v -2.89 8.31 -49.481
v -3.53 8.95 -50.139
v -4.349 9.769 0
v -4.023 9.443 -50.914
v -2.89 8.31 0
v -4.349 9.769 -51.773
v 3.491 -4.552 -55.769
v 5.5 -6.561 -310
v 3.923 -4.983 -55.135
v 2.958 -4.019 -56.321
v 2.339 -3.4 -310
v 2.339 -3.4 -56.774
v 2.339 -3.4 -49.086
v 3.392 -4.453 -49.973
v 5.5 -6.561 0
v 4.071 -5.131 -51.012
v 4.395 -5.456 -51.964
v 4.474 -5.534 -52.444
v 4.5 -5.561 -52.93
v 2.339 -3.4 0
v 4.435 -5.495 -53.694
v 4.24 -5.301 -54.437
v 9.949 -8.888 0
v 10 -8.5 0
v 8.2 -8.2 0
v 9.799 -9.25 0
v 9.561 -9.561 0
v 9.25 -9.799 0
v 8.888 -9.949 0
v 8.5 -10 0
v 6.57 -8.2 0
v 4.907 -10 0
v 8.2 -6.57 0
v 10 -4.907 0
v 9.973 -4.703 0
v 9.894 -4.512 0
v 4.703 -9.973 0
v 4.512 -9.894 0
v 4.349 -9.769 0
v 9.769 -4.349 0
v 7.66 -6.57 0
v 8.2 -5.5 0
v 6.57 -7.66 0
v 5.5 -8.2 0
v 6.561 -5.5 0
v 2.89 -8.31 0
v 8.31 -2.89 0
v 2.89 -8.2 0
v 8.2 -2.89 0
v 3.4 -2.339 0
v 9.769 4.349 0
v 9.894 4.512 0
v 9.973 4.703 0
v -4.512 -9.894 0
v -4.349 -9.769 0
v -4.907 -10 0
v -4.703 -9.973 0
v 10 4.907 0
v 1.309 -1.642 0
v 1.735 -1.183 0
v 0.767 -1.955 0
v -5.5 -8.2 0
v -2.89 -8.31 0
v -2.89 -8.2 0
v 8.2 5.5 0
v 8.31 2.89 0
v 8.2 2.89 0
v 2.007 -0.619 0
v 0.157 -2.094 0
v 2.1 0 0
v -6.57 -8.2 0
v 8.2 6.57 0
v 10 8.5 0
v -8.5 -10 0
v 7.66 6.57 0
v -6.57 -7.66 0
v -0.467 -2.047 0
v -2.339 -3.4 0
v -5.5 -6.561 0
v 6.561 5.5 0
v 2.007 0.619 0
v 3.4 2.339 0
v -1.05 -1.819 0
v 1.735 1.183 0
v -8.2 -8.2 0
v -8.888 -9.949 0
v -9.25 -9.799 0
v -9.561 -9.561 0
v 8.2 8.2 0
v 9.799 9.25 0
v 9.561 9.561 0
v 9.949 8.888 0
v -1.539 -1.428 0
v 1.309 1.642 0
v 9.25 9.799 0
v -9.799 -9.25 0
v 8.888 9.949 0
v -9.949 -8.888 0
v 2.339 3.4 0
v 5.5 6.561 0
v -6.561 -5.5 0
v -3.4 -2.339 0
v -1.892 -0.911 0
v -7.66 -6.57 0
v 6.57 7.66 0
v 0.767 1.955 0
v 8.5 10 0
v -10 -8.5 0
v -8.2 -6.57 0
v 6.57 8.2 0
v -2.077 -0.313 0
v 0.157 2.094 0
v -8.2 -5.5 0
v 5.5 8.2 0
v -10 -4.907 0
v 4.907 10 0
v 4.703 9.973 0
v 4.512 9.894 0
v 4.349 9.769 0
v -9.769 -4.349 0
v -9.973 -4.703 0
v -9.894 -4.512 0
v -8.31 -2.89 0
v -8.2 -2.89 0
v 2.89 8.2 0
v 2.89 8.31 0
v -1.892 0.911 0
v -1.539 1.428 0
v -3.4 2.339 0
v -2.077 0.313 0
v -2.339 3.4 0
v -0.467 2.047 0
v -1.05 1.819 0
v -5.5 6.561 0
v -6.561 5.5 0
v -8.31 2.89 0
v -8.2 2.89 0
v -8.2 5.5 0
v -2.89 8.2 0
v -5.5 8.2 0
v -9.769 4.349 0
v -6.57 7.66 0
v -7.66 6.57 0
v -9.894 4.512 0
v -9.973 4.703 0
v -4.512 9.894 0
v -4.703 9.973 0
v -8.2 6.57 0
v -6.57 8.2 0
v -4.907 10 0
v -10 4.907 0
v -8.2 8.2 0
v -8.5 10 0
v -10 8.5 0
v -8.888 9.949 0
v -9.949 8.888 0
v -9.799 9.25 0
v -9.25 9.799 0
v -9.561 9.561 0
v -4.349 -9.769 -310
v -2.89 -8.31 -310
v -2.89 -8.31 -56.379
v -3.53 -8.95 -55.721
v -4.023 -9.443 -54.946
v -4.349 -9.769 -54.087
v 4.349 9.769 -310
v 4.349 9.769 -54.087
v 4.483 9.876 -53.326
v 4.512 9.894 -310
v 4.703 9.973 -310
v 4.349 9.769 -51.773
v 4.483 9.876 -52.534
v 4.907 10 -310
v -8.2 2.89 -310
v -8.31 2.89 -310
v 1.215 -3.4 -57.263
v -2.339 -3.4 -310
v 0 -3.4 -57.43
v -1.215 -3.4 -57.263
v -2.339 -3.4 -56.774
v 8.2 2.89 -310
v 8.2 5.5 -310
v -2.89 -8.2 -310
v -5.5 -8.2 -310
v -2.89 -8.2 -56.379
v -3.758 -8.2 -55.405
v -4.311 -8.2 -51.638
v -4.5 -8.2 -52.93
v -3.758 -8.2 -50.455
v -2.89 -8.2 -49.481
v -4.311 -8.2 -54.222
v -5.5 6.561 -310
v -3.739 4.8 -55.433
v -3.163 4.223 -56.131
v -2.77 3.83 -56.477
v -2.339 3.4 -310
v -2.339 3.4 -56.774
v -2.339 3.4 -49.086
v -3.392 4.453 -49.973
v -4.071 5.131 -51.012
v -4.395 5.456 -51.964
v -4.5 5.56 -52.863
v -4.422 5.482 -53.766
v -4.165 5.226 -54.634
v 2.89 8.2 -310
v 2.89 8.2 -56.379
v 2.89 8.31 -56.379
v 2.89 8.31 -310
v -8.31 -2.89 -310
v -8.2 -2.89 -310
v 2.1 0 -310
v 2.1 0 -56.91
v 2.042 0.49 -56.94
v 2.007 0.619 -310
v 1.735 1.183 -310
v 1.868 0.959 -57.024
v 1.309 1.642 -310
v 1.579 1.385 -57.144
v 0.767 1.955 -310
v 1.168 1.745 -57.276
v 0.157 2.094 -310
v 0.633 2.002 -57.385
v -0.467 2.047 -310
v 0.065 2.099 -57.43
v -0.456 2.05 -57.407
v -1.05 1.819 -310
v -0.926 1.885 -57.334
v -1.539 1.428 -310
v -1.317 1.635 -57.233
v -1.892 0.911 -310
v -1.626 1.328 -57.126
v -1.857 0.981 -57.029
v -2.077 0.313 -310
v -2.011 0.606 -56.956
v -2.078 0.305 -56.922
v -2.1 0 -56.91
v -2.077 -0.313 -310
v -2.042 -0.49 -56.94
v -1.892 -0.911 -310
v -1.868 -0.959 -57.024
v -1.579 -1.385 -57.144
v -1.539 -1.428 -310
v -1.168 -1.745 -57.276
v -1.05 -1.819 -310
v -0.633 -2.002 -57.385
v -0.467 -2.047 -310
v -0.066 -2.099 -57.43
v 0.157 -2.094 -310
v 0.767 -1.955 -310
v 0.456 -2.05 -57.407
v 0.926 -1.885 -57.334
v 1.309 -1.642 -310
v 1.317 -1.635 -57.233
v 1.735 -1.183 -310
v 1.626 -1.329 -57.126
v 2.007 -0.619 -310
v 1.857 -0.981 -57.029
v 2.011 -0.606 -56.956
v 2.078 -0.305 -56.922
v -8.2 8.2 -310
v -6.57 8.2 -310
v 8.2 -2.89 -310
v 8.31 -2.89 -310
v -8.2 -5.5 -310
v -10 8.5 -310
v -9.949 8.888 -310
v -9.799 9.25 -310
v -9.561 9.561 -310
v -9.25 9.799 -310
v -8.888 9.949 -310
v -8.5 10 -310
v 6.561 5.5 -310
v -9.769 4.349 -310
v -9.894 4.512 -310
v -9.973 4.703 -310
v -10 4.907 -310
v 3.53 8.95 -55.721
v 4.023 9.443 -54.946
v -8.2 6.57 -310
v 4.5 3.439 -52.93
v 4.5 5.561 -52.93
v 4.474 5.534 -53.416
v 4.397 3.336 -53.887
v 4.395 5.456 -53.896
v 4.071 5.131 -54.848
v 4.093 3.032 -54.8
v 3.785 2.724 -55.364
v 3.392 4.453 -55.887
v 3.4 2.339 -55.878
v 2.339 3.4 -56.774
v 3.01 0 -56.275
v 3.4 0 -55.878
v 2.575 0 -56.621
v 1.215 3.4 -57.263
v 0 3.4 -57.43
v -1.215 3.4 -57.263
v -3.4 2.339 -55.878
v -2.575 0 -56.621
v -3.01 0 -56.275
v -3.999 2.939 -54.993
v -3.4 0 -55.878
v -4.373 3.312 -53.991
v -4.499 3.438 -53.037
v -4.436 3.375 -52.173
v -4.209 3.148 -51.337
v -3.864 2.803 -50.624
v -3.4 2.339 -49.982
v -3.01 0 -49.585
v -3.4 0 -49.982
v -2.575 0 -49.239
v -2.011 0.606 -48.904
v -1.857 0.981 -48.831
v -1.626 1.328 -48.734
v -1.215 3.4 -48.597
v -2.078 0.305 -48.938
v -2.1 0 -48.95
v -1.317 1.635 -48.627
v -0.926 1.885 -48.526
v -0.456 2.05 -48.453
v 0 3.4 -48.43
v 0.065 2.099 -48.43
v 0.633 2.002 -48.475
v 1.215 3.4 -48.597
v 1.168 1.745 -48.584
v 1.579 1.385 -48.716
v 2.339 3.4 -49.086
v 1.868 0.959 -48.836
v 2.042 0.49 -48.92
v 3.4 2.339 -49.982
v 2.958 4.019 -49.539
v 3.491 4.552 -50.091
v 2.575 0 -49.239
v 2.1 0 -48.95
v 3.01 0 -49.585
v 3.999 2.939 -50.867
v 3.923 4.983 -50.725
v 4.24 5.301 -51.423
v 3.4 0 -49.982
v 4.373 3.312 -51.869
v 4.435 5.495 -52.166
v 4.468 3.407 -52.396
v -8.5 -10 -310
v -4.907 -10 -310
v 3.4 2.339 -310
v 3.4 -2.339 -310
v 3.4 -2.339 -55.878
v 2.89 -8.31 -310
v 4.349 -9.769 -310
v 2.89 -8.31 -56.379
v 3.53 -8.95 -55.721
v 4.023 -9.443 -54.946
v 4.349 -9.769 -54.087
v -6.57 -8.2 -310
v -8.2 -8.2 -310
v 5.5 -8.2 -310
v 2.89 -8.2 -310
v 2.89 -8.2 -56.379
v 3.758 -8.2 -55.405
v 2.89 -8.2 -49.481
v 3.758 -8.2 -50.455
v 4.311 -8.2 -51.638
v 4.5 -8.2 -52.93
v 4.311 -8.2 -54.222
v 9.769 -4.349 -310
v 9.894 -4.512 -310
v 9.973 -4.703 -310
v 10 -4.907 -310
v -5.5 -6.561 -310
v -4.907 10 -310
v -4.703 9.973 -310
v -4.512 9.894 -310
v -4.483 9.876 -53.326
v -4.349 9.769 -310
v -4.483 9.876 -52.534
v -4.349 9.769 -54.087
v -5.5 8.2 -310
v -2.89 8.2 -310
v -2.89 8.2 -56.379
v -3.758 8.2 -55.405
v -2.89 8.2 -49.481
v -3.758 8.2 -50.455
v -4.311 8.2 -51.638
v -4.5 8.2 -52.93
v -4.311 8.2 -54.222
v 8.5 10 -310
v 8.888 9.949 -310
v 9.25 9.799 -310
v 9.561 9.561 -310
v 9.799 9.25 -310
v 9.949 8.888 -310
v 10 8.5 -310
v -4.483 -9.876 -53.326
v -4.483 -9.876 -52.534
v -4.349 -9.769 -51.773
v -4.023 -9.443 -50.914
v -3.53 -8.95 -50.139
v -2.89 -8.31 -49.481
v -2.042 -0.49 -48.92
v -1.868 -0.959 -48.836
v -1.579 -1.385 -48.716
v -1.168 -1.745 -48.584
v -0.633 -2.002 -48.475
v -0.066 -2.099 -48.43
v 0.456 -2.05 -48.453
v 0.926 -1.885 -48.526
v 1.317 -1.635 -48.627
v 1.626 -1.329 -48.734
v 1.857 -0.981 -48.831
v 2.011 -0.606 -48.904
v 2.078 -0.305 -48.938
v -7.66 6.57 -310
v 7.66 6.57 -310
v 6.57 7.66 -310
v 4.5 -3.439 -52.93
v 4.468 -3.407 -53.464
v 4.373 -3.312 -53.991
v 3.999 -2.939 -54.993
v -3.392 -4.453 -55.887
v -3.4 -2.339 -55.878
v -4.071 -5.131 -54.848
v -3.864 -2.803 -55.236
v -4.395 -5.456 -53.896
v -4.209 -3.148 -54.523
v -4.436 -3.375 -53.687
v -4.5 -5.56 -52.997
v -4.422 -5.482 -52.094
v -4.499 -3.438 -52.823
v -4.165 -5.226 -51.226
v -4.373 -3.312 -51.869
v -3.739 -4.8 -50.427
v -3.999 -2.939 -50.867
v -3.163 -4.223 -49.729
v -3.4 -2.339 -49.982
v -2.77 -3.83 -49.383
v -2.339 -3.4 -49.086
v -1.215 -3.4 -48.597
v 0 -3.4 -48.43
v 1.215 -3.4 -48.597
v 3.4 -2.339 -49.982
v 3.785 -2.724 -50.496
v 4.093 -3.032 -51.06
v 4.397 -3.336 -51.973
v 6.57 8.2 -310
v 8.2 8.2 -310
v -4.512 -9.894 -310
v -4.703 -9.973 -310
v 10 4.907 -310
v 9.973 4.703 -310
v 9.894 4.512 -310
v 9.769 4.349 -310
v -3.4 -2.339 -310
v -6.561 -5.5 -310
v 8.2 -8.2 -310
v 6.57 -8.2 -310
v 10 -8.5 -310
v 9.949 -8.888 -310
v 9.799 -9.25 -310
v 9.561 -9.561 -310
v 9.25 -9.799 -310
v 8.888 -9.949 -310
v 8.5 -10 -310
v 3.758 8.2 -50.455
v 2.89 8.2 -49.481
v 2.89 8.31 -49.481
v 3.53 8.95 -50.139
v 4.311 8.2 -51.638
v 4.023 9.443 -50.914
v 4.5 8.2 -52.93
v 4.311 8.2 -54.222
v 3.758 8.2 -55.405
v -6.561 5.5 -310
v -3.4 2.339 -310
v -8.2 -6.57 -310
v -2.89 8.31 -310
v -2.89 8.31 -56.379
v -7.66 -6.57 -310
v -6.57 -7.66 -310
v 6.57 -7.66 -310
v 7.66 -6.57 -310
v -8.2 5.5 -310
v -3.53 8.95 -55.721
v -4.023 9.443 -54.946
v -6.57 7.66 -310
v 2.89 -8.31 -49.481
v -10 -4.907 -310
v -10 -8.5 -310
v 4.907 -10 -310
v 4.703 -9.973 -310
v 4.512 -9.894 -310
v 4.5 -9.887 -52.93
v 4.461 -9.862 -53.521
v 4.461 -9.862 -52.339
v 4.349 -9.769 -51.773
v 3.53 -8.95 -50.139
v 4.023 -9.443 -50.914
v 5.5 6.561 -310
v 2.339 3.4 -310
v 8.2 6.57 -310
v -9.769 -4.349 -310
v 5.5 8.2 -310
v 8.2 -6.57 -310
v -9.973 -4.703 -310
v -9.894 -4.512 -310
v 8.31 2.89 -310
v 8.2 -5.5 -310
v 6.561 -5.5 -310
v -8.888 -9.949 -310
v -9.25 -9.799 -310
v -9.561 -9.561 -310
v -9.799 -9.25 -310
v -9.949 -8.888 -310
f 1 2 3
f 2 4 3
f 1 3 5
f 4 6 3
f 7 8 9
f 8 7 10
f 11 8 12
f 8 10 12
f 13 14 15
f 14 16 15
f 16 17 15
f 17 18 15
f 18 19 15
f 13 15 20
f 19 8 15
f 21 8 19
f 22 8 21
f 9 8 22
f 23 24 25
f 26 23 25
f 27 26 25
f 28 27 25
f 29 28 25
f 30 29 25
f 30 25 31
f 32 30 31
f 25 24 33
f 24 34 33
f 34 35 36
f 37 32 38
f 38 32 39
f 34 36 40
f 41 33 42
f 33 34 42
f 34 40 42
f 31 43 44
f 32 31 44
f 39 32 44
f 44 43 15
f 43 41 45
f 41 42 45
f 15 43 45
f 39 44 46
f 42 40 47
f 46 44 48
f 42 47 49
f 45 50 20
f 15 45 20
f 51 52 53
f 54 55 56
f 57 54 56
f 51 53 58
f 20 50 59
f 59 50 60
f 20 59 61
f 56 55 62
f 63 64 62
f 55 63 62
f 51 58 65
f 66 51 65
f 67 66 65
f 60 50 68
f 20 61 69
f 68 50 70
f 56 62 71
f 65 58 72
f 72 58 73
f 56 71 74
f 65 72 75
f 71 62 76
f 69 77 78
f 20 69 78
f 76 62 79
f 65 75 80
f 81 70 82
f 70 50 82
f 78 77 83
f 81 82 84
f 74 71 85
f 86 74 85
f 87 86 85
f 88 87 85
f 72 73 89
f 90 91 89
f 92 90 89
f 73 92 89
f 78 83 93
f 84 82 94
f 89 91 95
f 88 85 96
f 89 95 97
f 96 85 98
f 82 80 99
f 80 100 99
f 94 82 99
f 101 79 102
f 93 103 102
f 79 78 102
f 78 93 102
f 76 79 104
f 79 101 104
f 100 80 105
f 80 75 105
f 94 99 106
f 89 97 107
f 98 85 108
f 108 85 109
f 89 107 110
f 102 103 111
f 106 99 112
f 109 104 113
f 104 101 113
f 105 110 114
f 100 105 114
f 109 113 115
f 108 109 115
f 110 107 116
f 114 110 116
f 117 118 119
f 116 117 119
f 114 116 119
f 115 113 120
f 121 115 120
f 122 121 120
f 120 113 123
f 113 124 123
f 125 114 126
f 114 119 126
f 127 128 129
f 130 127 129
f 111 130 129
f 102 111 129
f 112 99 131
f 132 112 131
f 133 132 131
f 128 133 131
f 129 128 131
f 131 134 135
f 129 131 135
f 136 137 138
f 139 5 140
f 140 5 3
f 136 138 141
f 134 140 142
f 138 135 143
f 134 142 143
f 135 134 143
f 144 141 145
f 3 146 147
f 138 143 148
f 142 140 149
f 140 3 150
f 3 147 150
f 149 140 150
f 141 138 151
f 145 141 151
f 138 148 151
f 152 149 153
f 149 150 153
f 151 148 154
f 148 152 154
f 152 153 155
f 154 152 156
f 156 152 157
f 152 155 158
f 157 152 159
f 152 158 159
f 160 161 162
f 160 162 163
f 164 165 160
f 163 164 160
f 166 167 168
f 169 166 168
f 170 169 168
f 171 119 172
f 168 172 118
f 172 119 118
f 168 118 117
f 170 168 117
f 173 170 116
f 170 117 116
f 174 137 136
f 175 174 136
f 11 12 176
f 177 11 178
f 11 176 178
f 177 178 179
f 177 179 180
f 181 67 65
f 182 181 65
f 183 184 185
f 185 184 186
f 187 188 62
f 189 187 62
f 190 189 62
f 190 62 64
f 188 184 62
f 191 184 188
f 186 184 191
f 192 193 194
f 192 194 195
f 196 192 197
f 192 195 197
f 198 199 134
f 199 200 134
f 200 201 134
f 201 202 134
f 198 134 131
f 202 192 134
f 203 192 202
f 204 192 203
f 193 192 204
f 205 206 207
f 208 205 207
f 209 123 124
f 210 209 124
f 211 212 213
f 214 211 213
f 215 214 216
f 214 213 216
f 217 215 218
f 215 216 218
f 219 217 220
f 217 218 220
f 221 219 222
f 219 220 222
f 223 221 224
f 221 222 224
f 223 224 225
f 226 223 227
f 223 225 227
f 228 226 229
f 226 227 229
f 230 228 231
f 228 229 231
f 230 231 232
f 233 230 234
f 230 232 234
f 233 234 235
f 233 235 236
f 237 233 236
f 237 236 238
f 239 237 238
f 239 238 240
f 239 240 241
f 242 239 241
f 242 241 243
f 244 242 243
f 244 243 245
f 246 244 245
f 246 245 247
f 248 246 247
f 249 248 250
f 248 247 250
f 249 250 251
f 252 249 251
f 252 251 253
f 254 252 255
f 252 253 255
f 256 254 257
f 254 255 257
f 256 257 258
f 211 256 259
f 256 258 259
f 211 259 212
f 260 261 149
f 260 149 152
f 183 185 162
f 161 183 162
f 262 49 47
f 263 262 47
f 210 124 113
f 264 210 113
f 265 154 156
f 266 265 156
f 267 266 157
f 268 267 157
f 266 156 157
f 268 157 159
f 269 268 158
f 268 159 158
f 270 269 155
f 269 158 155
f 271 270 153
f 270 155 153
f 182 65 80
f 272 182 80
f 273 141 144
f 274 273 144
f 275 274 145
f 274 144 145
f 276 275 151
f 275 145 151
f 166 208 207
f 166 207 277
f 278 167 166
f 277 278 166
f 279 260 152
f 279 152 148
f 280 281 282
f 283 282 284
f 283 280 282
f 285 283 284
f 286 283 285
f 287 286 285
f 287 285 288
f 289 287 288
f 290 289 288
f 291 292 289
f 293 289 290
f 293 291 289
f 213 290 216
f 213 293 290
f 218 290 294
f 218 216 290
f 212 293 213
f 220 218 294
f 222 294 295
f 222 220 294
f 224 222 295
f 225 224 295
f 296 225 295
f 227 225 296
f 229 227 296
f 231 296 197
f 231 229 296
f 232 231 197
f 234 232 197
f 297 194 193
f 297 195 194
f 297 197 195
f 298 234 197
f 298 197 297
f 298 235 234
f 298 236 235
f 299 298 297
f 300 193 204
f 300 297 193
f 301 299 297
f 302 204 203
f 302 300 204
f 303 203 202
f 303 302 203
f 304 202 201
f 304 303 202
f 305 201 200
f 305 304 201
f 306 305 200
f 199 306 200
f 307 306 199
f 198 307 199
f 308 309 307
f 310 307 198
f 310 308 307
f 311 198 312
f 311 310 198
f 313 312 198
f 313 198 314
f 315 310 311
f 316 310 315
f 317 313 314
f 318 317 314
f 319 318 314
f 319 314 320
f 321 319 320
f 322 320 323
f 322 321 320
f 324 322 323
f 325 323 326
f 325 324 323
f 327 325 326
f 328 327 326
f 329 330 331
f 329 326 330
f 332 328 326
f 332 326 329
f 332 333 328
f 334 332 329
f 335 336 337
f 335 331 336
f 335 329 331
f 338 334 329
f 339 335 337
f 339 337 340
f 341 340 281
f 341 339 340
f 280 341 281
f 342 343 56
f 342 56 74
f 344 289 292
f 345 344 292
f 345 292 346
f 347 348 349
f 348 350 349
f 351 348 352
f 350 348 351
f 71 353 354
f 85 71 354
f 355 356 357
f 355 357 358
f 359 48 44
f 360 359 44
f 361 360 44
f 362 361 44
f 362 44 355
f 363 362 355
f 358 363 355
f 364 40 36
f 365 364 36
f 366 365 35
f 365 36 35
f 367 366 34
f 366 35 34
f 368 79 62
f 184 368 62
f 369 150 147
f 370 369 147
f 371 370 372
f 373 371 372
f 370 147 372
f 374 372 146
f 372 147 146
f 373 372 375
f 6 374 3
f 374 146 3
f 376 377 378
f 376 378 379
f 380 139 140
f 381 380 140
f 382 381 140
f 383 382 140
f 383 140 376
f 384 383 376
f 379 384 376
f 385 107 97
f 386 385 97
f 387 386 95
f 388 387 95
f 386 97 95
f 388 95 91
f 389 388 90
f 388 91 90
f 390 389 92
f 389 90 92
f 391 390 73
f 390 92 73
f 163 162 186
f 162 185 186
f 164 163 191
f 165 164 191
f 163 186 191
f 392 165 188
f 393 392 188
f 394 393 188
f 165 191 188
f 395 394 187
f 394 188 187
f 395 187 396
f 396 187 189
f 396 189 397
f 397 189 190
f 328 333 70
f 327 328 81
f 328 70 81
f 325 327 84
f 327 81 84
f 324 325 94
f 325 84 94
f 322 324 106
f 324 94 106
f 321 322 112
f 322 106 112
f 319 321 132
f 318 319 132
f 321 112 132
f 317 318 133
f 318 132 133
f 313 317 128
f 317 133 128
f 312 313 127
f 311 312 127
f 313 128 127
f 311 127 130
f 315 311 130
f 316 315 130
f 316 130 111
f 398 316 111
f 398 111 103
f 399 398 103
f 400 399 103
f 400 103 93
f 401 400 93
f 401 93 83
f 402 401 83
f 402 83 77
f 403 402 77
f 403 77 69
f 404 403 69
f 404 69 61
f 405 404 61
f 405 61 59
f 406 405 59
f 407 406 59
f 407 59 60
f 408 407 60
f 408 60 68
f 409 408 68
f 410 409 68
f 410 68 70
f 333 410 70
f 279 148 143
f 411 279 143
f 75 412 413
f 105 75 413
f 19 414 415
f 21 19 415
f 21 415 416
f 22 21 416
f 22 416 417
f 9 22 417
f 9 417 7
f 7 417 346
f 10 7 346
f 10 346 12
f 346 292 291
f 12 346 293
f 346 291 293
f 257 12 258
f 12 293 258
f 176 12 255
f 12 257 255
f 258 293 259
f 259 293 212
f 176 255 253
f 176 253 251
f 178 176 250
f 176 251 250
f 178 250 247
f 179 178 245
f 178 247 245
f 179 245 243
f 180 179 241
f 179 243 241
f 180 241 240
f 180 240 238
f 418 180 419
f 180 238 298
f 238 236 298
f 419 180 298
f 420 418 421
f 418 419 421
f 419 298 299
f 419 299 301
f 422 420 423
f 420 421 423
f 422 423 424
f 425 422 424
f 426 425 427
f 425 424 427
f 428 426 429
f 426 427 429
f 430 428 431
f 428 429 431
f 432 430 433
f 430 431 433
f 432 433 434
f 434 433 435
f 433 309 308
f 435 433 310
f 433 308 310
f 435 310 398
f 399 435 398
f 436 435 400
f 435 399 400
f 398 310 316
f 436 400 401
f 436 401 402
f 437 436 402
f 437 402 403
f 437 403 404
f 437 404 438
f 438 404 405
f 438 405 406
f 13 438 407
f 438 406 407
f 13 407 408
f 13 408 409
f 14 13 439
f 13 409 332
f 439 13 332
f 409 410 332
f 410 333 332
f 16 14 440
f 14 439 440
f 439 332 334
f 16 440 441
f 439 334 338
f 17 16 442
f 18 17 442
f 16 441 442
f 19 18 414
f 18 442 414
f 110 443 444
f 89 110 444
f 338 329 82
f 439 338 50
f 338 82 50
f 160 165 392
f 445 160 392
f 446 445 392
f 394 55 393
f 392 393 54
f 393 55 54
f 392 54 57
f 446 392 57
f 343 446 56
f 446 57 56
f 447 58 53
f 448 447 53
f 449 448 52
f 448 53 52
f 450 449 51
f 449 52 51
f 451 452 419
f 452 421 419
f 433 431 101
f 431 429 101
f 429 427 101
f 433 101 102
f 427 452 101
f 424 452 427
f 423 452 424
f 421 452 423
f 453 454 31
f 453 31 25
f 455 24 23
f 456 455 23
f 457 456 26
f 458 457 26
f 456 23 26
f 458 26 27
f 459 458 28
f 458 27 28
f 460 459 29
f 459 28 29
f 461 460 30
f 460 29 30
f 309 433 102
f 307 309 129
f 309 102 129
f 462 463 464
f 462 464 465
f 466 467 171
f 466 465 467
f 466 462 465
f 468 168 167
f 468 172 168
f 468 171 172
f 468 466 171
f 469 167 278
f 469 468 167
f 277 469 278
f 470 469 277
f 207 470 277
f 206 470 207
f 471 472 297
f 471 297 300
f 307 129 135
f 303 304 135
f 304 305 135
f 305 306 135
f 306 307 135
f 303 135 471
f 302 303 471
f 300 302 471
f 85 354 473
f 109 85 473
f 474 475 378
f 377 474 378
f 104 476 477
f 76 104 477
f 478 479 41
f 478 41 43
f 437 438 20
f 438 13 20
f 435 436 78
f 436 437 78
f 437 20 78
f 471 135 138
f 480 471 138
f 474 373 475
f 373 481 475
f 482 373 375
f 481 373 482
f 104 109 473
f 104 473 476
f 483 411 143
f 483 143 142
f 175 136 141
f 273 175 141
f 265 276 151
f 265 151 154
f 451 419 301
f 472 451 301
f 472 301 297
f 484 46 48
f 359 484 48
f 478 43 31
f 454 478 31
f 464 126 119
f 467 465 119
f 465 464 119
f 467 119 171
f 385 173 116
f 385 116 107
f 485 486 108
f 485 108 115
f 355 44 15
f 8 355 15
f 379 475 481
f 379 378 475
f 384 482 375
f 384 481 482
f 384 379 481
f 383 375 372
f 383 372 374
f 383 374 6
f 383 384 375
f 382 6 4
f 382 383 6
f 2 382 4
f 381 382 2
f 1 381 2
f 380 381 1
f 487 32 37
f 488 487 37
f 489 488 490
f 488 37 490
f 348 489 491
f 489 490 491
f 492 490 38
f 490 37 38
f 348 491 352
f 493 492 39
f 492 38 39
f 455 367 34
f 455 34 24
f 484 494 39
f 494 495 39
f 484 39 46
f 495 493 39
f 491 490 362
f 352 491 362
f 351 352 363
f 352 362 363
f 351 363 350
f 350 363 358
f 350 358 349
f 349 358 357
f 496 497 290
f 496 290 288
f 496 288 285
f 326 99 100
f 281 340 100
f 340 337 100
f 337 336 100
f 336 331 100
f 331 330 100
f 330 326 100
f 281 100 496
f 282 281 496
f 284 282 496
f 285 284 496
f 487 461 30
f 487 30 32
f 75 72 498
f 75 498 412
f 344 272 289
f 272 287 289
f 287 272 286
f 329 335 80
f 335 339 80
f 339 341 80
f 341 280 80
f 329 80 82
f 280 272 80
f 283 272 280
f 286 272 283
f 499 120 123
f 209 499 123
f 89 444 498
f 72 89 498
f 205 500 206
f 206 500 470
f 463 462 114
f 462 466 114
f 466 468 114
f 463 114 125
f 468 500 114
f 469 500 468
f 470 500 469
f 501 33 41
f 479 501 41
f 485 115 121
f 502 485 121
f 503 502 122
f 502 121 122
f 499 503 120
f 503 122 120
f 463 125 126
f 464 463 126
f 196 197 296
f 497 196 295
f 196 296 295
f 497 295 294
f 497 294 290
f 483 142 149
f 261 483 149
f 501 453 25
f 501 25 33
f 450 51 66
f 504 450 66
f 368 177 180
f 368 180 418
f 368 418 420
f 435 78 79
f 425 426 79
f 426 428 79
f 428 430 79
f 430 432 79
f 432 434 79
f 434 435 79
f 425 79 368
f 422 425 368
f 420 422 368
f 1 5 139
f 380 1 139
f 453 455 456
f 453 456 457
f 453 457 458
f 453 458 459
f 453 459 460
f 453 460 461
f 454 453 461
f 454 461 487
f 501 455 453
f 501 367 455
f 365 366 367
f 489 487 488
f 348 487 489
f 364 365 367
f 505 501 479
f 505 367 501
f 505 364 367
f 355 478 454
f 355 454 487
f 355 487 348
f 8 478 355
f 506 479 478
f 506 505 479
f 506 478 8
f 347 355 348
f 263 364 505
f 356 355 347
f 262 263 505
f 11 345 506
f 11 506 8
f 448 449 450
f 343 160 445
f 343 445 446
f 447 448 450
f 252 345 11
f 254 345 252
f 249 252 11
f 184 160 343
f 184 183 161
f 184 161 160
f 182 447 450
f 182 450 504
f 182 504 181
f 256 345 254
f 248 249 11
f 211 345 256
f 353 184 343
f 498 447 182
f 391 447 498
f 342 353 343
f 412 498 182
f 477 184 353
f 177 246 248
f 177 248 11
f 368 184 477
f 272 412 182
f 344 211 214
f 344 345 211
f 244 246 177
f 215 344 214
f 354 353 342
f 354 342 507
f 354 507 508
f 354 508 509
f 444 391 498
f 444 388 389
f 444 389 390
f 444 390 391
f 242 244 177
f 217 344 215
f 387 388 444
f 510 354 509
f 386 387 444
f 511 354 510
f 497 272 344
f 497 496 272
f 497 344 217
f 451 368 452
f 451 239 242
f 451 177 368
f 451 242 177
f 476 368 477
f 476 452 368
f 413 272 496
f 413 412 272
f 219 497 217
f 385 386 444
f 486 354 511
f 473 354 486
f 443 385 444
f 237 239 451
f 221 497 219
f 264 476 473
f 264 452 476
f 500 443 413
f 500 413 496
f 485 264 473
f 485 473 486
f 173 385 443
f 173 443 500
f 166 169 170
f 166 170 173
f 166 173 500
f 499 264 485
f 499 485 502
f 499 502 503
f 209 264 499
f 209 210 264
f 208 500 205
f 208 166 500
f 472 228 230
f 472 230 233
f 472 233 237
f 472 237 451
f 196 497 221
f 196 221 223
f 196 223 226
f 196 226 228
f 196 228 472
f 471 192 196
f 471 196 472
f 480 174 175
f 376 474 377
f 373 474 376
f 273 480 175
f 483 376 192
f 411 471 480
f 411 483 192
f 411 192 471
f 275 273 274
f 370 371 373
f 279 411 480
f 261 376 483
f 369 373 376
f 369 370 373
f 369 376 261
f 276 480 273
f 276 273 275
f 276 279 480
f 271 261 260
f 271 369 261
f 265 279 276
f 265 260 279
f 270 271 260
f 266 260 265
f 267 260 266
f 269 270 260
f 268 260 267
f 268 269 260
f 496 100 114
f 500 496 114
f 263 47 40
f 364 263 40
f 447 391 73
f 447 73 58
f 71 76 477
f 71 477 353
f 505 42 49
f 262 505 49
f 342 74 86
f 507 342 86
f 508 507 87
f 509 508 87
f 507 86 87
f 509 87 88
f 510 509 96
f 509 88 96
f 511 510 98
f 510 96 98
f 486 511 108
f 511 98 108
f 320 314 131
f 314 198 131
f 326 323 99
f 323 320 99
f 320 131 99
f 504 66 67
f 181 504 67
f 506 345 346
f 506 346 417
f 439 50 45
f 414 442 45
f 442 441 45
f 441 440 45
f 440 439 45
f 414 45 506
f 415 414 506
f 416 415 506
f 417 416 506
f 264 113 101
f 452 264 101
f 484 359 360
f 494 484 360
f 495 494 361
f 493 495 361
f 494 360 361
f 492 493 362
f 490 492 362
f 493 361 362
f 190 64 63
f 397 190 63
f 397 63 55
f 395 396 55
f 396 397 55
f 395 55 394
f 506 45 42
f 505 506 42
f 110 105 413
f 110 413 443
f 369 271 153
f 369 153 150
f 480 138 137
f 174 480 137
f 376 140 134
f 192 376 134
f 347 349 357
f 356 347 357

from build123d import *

# Parameters (mm, degrees)
SKETCH6_R               = 2.1
BOSS_EXTRUDE1_DEPTH     = 310
SKETCH7_R               = 4.5
CUT_EXTRUDE1_DEPTH      = 11
CUT_EXTRUDE1_DEPTH_BACK = 11


with BuildPart() as part:
    # Sketch6 → Boss-Extrude1 (new body)
    with BuildSketch(Plane.XY):
        with BuildLine():
            Line((-3.4, -2.339339828), (-3.4, 2.339339828))
            Line((-3.4, 2.339339828), (-6.560660172, 5.5))
            Line((-6.560660172, 5.5), (-8.2, 5.5))
            Line((-8.2, 5.5), (-8.2, 2.89))
            Line((-8.2, 2.89), (-8.31, 2.89))
            Line((-8.31, 2.89), (-9.768614357, 4.348614357))
            ThreePointArc((-9.768614357, 4.348614357), (-9.939864831, 4.604908803), (-10, 4.907228714))
            Line((-10, 4.907228714), (-10, 8.5))
            ThreePointArc((-10, 8.5), (-9.560660172, 9.560660172), (-8.5, 10))
            Line((-8.5, 10), (-4.907228714, 10))
            ThreePointArc((-4.907228714, 10), (-4.604908803, 9.939864831), (-4.348614357, 9.768614357))
            Line((-4.348614357, 9.768614357), (-2.89, 8.31))
            Line((-2.89, 8.31), (-2.89, 8.2))
            Line((-2.89, 8.2), (-5.5, 8.2))
            Line((-5.5, 8.2), (-5.5, 6.560660172))
            Line((-5.5, 6.560660172), (-2.339339828, 3.4))
            Line((-2.339339828, 3.4), (2.339339828, 3.4))
            Line((2.339339828, 3.4), (5.5, 6.560660172))
            Line((5.5, 6.560660172), (5.5, 8.2))
            Line((5.5, 8.2), (2.89, 8.2))
            Line((2.89, 8.2), (2.89, 8.31))
            Line((2.89, 8.31), (4.348614357, 9.768614357))
            ThreePointArc((4.348614357, 9.768614357), (4.604908803, 9.939864831), (4.907228714, 10))
            Line((4.907228714, 10), (8.5, 10))
            ThreePointArc((8.5, 10), (9.560660172, 9.560660172), (10, 8.5))
            Line((10, 8.5), (10, 4.907228714))
            ThreePointArc((10, 4.907228714), (9.939864831, 4.604908803), (9.768614357, 4.348614357))
            Line((9.768614357, 4.348614357), (8.31, 2.89))
            Line((8.31, 2.89), (8.2, 2.89))
            Line((8.2, 2.89), (8.2, 5.5))
            Line((8.2, 5.5), (6.560660172, 5.5))
            Line((6.560660172, 5.5), (3.4, 2.339339828))
            Line((3.4, 2.339339828), (3.4, -2.339339828))
            Line((3.4, -2.339339828), (6.560660172, -5.5))
            Line((6.560660172, -5.5), (8.2, -5.5))
            Line((8.2, -5.5), (8.2, -2.89))
            Line((8.2, -2.89), (8.31, -2.89))
            Line((8.31, -2.89), (9.768614357, -4.348614357))
            ThreePointArc((9.768614357, -4.348614357), (9.939864831, -4.604908803), (10, -4.907228714))
            Line((10, -4.907228714), (10, -8.5))
            ThreePointArc((10, -8.5), (9.560660172, -9.560660172), (8.5, -10))
            Line((8.5, -10), (4.907228714, -10))
            ThreePointArc((4.907228714, -10), (4.604908803, -9.939864831), (4.348614357, -9.768614357))
            Line((4.348614357, -9.768614357), (2.89, -8.31))
            Line((2.89, -8.31), (2.89, -8.2))
            Line((2.89, -8.2), (5.5, -8.2))
            Line((5.5, -8.2), (5.5, -6.560660172))
            Line((5.5, -6.560660172), (2.339339828, -3.4))
            Line((2.339339828, -3.4), (-2.339339828, -3.4))
            Line((-2.339339828, -3.4), (-5.5, -6.560660172))
            Line((-5.5, -6.560660172), (-5.5, -8.2))
            Line((-5.5, -8.2), (-2.89, -8.2))
            Line((-2.89, -8.2), (-2.89, -8.31))
            Line((-2.89, -8.31), (-4.348614357, -9.768614357))
            ThreePointArc((-4.348614357, -9.768614357), (-4.604908803, -9.939864831), (-4.907228714, -10))
            Line((-4.907228714, -10), (-8.5, -10))
            ThreePointArc((-8.5, -10), (-9.560660172, -9.560660172), (-10, -8.5))
            Line((-10, -8.5), (-10, -4.907228714))
            ThreePointArc((-10, -4.907228714), (-9.939864831, -4.604908803), (-9.768614357, -4.348614357))
            Line((-9.768614357, -4.348614357), (-8.31, -2.89))
            Line((-8.31, -2.89), (-8.2, -2.89))
            Line((-8.2, -2.89), (-8.2, -5.5))
            Line((-8.2, -5.5), (-6.560660172, -5.5))
            Line((-6.560660172, -5.5), (-3.4, -2.339339828))
        make_face()
        Circle(SKETCH6_R, mode=Mode.SUBTRACT)
        Polygon((-7.66, 6.57), (-6.57, 7.66), (-6.57, 8.2), (-8.2, 8.2), (-8.2, 6.57), align=None, mode=Mode.SUBTRACT)
        Polygon((8.2, 6.57), (7.66, 6.57), (6.57, 7.66), (6.57, 8.2), (8.2, 8.2), align=None, mode=Mode.SUBTRACT)
        Polygon((7.66, -6.57), (6.57, -7.66), (6.57, -8.2), (8.2, -8.2), (8.2, -6.57), align=None, mode=Mode.SUBTRACT)
        Polygon((-8.2, -6.57), (-7.66, -6.57), (-6.57, -7.66), (-6.57, -8.2), (-8.2, -8.2), align=None, mode=Mode.SUBTRACT)
    extrude(amount=-BOSS_EXTRUDE1_DEPTH)

    # Sketch7 → Cut-Extrude1 (cut, two sides)
    with BuildSketch(Plane(origin=(0, 0, 0), x_dir=(1, 0, 0), z_dir=(0, 1, 0))) as cut_extrude1_sk:
        with Locations((0, 52.93)):
            Circle(SKETCH7_R)
    extrude(amount=CUT_EXTRUDE1_DEPTH, mode=Mode.SUBTRACT)
    extrude(cut_extrude1_sk.sketch, amount=-CUT_EXTRUDE1_DEPTH_BACK, mode=Mode.SUBTRACT)


solid = part.part
